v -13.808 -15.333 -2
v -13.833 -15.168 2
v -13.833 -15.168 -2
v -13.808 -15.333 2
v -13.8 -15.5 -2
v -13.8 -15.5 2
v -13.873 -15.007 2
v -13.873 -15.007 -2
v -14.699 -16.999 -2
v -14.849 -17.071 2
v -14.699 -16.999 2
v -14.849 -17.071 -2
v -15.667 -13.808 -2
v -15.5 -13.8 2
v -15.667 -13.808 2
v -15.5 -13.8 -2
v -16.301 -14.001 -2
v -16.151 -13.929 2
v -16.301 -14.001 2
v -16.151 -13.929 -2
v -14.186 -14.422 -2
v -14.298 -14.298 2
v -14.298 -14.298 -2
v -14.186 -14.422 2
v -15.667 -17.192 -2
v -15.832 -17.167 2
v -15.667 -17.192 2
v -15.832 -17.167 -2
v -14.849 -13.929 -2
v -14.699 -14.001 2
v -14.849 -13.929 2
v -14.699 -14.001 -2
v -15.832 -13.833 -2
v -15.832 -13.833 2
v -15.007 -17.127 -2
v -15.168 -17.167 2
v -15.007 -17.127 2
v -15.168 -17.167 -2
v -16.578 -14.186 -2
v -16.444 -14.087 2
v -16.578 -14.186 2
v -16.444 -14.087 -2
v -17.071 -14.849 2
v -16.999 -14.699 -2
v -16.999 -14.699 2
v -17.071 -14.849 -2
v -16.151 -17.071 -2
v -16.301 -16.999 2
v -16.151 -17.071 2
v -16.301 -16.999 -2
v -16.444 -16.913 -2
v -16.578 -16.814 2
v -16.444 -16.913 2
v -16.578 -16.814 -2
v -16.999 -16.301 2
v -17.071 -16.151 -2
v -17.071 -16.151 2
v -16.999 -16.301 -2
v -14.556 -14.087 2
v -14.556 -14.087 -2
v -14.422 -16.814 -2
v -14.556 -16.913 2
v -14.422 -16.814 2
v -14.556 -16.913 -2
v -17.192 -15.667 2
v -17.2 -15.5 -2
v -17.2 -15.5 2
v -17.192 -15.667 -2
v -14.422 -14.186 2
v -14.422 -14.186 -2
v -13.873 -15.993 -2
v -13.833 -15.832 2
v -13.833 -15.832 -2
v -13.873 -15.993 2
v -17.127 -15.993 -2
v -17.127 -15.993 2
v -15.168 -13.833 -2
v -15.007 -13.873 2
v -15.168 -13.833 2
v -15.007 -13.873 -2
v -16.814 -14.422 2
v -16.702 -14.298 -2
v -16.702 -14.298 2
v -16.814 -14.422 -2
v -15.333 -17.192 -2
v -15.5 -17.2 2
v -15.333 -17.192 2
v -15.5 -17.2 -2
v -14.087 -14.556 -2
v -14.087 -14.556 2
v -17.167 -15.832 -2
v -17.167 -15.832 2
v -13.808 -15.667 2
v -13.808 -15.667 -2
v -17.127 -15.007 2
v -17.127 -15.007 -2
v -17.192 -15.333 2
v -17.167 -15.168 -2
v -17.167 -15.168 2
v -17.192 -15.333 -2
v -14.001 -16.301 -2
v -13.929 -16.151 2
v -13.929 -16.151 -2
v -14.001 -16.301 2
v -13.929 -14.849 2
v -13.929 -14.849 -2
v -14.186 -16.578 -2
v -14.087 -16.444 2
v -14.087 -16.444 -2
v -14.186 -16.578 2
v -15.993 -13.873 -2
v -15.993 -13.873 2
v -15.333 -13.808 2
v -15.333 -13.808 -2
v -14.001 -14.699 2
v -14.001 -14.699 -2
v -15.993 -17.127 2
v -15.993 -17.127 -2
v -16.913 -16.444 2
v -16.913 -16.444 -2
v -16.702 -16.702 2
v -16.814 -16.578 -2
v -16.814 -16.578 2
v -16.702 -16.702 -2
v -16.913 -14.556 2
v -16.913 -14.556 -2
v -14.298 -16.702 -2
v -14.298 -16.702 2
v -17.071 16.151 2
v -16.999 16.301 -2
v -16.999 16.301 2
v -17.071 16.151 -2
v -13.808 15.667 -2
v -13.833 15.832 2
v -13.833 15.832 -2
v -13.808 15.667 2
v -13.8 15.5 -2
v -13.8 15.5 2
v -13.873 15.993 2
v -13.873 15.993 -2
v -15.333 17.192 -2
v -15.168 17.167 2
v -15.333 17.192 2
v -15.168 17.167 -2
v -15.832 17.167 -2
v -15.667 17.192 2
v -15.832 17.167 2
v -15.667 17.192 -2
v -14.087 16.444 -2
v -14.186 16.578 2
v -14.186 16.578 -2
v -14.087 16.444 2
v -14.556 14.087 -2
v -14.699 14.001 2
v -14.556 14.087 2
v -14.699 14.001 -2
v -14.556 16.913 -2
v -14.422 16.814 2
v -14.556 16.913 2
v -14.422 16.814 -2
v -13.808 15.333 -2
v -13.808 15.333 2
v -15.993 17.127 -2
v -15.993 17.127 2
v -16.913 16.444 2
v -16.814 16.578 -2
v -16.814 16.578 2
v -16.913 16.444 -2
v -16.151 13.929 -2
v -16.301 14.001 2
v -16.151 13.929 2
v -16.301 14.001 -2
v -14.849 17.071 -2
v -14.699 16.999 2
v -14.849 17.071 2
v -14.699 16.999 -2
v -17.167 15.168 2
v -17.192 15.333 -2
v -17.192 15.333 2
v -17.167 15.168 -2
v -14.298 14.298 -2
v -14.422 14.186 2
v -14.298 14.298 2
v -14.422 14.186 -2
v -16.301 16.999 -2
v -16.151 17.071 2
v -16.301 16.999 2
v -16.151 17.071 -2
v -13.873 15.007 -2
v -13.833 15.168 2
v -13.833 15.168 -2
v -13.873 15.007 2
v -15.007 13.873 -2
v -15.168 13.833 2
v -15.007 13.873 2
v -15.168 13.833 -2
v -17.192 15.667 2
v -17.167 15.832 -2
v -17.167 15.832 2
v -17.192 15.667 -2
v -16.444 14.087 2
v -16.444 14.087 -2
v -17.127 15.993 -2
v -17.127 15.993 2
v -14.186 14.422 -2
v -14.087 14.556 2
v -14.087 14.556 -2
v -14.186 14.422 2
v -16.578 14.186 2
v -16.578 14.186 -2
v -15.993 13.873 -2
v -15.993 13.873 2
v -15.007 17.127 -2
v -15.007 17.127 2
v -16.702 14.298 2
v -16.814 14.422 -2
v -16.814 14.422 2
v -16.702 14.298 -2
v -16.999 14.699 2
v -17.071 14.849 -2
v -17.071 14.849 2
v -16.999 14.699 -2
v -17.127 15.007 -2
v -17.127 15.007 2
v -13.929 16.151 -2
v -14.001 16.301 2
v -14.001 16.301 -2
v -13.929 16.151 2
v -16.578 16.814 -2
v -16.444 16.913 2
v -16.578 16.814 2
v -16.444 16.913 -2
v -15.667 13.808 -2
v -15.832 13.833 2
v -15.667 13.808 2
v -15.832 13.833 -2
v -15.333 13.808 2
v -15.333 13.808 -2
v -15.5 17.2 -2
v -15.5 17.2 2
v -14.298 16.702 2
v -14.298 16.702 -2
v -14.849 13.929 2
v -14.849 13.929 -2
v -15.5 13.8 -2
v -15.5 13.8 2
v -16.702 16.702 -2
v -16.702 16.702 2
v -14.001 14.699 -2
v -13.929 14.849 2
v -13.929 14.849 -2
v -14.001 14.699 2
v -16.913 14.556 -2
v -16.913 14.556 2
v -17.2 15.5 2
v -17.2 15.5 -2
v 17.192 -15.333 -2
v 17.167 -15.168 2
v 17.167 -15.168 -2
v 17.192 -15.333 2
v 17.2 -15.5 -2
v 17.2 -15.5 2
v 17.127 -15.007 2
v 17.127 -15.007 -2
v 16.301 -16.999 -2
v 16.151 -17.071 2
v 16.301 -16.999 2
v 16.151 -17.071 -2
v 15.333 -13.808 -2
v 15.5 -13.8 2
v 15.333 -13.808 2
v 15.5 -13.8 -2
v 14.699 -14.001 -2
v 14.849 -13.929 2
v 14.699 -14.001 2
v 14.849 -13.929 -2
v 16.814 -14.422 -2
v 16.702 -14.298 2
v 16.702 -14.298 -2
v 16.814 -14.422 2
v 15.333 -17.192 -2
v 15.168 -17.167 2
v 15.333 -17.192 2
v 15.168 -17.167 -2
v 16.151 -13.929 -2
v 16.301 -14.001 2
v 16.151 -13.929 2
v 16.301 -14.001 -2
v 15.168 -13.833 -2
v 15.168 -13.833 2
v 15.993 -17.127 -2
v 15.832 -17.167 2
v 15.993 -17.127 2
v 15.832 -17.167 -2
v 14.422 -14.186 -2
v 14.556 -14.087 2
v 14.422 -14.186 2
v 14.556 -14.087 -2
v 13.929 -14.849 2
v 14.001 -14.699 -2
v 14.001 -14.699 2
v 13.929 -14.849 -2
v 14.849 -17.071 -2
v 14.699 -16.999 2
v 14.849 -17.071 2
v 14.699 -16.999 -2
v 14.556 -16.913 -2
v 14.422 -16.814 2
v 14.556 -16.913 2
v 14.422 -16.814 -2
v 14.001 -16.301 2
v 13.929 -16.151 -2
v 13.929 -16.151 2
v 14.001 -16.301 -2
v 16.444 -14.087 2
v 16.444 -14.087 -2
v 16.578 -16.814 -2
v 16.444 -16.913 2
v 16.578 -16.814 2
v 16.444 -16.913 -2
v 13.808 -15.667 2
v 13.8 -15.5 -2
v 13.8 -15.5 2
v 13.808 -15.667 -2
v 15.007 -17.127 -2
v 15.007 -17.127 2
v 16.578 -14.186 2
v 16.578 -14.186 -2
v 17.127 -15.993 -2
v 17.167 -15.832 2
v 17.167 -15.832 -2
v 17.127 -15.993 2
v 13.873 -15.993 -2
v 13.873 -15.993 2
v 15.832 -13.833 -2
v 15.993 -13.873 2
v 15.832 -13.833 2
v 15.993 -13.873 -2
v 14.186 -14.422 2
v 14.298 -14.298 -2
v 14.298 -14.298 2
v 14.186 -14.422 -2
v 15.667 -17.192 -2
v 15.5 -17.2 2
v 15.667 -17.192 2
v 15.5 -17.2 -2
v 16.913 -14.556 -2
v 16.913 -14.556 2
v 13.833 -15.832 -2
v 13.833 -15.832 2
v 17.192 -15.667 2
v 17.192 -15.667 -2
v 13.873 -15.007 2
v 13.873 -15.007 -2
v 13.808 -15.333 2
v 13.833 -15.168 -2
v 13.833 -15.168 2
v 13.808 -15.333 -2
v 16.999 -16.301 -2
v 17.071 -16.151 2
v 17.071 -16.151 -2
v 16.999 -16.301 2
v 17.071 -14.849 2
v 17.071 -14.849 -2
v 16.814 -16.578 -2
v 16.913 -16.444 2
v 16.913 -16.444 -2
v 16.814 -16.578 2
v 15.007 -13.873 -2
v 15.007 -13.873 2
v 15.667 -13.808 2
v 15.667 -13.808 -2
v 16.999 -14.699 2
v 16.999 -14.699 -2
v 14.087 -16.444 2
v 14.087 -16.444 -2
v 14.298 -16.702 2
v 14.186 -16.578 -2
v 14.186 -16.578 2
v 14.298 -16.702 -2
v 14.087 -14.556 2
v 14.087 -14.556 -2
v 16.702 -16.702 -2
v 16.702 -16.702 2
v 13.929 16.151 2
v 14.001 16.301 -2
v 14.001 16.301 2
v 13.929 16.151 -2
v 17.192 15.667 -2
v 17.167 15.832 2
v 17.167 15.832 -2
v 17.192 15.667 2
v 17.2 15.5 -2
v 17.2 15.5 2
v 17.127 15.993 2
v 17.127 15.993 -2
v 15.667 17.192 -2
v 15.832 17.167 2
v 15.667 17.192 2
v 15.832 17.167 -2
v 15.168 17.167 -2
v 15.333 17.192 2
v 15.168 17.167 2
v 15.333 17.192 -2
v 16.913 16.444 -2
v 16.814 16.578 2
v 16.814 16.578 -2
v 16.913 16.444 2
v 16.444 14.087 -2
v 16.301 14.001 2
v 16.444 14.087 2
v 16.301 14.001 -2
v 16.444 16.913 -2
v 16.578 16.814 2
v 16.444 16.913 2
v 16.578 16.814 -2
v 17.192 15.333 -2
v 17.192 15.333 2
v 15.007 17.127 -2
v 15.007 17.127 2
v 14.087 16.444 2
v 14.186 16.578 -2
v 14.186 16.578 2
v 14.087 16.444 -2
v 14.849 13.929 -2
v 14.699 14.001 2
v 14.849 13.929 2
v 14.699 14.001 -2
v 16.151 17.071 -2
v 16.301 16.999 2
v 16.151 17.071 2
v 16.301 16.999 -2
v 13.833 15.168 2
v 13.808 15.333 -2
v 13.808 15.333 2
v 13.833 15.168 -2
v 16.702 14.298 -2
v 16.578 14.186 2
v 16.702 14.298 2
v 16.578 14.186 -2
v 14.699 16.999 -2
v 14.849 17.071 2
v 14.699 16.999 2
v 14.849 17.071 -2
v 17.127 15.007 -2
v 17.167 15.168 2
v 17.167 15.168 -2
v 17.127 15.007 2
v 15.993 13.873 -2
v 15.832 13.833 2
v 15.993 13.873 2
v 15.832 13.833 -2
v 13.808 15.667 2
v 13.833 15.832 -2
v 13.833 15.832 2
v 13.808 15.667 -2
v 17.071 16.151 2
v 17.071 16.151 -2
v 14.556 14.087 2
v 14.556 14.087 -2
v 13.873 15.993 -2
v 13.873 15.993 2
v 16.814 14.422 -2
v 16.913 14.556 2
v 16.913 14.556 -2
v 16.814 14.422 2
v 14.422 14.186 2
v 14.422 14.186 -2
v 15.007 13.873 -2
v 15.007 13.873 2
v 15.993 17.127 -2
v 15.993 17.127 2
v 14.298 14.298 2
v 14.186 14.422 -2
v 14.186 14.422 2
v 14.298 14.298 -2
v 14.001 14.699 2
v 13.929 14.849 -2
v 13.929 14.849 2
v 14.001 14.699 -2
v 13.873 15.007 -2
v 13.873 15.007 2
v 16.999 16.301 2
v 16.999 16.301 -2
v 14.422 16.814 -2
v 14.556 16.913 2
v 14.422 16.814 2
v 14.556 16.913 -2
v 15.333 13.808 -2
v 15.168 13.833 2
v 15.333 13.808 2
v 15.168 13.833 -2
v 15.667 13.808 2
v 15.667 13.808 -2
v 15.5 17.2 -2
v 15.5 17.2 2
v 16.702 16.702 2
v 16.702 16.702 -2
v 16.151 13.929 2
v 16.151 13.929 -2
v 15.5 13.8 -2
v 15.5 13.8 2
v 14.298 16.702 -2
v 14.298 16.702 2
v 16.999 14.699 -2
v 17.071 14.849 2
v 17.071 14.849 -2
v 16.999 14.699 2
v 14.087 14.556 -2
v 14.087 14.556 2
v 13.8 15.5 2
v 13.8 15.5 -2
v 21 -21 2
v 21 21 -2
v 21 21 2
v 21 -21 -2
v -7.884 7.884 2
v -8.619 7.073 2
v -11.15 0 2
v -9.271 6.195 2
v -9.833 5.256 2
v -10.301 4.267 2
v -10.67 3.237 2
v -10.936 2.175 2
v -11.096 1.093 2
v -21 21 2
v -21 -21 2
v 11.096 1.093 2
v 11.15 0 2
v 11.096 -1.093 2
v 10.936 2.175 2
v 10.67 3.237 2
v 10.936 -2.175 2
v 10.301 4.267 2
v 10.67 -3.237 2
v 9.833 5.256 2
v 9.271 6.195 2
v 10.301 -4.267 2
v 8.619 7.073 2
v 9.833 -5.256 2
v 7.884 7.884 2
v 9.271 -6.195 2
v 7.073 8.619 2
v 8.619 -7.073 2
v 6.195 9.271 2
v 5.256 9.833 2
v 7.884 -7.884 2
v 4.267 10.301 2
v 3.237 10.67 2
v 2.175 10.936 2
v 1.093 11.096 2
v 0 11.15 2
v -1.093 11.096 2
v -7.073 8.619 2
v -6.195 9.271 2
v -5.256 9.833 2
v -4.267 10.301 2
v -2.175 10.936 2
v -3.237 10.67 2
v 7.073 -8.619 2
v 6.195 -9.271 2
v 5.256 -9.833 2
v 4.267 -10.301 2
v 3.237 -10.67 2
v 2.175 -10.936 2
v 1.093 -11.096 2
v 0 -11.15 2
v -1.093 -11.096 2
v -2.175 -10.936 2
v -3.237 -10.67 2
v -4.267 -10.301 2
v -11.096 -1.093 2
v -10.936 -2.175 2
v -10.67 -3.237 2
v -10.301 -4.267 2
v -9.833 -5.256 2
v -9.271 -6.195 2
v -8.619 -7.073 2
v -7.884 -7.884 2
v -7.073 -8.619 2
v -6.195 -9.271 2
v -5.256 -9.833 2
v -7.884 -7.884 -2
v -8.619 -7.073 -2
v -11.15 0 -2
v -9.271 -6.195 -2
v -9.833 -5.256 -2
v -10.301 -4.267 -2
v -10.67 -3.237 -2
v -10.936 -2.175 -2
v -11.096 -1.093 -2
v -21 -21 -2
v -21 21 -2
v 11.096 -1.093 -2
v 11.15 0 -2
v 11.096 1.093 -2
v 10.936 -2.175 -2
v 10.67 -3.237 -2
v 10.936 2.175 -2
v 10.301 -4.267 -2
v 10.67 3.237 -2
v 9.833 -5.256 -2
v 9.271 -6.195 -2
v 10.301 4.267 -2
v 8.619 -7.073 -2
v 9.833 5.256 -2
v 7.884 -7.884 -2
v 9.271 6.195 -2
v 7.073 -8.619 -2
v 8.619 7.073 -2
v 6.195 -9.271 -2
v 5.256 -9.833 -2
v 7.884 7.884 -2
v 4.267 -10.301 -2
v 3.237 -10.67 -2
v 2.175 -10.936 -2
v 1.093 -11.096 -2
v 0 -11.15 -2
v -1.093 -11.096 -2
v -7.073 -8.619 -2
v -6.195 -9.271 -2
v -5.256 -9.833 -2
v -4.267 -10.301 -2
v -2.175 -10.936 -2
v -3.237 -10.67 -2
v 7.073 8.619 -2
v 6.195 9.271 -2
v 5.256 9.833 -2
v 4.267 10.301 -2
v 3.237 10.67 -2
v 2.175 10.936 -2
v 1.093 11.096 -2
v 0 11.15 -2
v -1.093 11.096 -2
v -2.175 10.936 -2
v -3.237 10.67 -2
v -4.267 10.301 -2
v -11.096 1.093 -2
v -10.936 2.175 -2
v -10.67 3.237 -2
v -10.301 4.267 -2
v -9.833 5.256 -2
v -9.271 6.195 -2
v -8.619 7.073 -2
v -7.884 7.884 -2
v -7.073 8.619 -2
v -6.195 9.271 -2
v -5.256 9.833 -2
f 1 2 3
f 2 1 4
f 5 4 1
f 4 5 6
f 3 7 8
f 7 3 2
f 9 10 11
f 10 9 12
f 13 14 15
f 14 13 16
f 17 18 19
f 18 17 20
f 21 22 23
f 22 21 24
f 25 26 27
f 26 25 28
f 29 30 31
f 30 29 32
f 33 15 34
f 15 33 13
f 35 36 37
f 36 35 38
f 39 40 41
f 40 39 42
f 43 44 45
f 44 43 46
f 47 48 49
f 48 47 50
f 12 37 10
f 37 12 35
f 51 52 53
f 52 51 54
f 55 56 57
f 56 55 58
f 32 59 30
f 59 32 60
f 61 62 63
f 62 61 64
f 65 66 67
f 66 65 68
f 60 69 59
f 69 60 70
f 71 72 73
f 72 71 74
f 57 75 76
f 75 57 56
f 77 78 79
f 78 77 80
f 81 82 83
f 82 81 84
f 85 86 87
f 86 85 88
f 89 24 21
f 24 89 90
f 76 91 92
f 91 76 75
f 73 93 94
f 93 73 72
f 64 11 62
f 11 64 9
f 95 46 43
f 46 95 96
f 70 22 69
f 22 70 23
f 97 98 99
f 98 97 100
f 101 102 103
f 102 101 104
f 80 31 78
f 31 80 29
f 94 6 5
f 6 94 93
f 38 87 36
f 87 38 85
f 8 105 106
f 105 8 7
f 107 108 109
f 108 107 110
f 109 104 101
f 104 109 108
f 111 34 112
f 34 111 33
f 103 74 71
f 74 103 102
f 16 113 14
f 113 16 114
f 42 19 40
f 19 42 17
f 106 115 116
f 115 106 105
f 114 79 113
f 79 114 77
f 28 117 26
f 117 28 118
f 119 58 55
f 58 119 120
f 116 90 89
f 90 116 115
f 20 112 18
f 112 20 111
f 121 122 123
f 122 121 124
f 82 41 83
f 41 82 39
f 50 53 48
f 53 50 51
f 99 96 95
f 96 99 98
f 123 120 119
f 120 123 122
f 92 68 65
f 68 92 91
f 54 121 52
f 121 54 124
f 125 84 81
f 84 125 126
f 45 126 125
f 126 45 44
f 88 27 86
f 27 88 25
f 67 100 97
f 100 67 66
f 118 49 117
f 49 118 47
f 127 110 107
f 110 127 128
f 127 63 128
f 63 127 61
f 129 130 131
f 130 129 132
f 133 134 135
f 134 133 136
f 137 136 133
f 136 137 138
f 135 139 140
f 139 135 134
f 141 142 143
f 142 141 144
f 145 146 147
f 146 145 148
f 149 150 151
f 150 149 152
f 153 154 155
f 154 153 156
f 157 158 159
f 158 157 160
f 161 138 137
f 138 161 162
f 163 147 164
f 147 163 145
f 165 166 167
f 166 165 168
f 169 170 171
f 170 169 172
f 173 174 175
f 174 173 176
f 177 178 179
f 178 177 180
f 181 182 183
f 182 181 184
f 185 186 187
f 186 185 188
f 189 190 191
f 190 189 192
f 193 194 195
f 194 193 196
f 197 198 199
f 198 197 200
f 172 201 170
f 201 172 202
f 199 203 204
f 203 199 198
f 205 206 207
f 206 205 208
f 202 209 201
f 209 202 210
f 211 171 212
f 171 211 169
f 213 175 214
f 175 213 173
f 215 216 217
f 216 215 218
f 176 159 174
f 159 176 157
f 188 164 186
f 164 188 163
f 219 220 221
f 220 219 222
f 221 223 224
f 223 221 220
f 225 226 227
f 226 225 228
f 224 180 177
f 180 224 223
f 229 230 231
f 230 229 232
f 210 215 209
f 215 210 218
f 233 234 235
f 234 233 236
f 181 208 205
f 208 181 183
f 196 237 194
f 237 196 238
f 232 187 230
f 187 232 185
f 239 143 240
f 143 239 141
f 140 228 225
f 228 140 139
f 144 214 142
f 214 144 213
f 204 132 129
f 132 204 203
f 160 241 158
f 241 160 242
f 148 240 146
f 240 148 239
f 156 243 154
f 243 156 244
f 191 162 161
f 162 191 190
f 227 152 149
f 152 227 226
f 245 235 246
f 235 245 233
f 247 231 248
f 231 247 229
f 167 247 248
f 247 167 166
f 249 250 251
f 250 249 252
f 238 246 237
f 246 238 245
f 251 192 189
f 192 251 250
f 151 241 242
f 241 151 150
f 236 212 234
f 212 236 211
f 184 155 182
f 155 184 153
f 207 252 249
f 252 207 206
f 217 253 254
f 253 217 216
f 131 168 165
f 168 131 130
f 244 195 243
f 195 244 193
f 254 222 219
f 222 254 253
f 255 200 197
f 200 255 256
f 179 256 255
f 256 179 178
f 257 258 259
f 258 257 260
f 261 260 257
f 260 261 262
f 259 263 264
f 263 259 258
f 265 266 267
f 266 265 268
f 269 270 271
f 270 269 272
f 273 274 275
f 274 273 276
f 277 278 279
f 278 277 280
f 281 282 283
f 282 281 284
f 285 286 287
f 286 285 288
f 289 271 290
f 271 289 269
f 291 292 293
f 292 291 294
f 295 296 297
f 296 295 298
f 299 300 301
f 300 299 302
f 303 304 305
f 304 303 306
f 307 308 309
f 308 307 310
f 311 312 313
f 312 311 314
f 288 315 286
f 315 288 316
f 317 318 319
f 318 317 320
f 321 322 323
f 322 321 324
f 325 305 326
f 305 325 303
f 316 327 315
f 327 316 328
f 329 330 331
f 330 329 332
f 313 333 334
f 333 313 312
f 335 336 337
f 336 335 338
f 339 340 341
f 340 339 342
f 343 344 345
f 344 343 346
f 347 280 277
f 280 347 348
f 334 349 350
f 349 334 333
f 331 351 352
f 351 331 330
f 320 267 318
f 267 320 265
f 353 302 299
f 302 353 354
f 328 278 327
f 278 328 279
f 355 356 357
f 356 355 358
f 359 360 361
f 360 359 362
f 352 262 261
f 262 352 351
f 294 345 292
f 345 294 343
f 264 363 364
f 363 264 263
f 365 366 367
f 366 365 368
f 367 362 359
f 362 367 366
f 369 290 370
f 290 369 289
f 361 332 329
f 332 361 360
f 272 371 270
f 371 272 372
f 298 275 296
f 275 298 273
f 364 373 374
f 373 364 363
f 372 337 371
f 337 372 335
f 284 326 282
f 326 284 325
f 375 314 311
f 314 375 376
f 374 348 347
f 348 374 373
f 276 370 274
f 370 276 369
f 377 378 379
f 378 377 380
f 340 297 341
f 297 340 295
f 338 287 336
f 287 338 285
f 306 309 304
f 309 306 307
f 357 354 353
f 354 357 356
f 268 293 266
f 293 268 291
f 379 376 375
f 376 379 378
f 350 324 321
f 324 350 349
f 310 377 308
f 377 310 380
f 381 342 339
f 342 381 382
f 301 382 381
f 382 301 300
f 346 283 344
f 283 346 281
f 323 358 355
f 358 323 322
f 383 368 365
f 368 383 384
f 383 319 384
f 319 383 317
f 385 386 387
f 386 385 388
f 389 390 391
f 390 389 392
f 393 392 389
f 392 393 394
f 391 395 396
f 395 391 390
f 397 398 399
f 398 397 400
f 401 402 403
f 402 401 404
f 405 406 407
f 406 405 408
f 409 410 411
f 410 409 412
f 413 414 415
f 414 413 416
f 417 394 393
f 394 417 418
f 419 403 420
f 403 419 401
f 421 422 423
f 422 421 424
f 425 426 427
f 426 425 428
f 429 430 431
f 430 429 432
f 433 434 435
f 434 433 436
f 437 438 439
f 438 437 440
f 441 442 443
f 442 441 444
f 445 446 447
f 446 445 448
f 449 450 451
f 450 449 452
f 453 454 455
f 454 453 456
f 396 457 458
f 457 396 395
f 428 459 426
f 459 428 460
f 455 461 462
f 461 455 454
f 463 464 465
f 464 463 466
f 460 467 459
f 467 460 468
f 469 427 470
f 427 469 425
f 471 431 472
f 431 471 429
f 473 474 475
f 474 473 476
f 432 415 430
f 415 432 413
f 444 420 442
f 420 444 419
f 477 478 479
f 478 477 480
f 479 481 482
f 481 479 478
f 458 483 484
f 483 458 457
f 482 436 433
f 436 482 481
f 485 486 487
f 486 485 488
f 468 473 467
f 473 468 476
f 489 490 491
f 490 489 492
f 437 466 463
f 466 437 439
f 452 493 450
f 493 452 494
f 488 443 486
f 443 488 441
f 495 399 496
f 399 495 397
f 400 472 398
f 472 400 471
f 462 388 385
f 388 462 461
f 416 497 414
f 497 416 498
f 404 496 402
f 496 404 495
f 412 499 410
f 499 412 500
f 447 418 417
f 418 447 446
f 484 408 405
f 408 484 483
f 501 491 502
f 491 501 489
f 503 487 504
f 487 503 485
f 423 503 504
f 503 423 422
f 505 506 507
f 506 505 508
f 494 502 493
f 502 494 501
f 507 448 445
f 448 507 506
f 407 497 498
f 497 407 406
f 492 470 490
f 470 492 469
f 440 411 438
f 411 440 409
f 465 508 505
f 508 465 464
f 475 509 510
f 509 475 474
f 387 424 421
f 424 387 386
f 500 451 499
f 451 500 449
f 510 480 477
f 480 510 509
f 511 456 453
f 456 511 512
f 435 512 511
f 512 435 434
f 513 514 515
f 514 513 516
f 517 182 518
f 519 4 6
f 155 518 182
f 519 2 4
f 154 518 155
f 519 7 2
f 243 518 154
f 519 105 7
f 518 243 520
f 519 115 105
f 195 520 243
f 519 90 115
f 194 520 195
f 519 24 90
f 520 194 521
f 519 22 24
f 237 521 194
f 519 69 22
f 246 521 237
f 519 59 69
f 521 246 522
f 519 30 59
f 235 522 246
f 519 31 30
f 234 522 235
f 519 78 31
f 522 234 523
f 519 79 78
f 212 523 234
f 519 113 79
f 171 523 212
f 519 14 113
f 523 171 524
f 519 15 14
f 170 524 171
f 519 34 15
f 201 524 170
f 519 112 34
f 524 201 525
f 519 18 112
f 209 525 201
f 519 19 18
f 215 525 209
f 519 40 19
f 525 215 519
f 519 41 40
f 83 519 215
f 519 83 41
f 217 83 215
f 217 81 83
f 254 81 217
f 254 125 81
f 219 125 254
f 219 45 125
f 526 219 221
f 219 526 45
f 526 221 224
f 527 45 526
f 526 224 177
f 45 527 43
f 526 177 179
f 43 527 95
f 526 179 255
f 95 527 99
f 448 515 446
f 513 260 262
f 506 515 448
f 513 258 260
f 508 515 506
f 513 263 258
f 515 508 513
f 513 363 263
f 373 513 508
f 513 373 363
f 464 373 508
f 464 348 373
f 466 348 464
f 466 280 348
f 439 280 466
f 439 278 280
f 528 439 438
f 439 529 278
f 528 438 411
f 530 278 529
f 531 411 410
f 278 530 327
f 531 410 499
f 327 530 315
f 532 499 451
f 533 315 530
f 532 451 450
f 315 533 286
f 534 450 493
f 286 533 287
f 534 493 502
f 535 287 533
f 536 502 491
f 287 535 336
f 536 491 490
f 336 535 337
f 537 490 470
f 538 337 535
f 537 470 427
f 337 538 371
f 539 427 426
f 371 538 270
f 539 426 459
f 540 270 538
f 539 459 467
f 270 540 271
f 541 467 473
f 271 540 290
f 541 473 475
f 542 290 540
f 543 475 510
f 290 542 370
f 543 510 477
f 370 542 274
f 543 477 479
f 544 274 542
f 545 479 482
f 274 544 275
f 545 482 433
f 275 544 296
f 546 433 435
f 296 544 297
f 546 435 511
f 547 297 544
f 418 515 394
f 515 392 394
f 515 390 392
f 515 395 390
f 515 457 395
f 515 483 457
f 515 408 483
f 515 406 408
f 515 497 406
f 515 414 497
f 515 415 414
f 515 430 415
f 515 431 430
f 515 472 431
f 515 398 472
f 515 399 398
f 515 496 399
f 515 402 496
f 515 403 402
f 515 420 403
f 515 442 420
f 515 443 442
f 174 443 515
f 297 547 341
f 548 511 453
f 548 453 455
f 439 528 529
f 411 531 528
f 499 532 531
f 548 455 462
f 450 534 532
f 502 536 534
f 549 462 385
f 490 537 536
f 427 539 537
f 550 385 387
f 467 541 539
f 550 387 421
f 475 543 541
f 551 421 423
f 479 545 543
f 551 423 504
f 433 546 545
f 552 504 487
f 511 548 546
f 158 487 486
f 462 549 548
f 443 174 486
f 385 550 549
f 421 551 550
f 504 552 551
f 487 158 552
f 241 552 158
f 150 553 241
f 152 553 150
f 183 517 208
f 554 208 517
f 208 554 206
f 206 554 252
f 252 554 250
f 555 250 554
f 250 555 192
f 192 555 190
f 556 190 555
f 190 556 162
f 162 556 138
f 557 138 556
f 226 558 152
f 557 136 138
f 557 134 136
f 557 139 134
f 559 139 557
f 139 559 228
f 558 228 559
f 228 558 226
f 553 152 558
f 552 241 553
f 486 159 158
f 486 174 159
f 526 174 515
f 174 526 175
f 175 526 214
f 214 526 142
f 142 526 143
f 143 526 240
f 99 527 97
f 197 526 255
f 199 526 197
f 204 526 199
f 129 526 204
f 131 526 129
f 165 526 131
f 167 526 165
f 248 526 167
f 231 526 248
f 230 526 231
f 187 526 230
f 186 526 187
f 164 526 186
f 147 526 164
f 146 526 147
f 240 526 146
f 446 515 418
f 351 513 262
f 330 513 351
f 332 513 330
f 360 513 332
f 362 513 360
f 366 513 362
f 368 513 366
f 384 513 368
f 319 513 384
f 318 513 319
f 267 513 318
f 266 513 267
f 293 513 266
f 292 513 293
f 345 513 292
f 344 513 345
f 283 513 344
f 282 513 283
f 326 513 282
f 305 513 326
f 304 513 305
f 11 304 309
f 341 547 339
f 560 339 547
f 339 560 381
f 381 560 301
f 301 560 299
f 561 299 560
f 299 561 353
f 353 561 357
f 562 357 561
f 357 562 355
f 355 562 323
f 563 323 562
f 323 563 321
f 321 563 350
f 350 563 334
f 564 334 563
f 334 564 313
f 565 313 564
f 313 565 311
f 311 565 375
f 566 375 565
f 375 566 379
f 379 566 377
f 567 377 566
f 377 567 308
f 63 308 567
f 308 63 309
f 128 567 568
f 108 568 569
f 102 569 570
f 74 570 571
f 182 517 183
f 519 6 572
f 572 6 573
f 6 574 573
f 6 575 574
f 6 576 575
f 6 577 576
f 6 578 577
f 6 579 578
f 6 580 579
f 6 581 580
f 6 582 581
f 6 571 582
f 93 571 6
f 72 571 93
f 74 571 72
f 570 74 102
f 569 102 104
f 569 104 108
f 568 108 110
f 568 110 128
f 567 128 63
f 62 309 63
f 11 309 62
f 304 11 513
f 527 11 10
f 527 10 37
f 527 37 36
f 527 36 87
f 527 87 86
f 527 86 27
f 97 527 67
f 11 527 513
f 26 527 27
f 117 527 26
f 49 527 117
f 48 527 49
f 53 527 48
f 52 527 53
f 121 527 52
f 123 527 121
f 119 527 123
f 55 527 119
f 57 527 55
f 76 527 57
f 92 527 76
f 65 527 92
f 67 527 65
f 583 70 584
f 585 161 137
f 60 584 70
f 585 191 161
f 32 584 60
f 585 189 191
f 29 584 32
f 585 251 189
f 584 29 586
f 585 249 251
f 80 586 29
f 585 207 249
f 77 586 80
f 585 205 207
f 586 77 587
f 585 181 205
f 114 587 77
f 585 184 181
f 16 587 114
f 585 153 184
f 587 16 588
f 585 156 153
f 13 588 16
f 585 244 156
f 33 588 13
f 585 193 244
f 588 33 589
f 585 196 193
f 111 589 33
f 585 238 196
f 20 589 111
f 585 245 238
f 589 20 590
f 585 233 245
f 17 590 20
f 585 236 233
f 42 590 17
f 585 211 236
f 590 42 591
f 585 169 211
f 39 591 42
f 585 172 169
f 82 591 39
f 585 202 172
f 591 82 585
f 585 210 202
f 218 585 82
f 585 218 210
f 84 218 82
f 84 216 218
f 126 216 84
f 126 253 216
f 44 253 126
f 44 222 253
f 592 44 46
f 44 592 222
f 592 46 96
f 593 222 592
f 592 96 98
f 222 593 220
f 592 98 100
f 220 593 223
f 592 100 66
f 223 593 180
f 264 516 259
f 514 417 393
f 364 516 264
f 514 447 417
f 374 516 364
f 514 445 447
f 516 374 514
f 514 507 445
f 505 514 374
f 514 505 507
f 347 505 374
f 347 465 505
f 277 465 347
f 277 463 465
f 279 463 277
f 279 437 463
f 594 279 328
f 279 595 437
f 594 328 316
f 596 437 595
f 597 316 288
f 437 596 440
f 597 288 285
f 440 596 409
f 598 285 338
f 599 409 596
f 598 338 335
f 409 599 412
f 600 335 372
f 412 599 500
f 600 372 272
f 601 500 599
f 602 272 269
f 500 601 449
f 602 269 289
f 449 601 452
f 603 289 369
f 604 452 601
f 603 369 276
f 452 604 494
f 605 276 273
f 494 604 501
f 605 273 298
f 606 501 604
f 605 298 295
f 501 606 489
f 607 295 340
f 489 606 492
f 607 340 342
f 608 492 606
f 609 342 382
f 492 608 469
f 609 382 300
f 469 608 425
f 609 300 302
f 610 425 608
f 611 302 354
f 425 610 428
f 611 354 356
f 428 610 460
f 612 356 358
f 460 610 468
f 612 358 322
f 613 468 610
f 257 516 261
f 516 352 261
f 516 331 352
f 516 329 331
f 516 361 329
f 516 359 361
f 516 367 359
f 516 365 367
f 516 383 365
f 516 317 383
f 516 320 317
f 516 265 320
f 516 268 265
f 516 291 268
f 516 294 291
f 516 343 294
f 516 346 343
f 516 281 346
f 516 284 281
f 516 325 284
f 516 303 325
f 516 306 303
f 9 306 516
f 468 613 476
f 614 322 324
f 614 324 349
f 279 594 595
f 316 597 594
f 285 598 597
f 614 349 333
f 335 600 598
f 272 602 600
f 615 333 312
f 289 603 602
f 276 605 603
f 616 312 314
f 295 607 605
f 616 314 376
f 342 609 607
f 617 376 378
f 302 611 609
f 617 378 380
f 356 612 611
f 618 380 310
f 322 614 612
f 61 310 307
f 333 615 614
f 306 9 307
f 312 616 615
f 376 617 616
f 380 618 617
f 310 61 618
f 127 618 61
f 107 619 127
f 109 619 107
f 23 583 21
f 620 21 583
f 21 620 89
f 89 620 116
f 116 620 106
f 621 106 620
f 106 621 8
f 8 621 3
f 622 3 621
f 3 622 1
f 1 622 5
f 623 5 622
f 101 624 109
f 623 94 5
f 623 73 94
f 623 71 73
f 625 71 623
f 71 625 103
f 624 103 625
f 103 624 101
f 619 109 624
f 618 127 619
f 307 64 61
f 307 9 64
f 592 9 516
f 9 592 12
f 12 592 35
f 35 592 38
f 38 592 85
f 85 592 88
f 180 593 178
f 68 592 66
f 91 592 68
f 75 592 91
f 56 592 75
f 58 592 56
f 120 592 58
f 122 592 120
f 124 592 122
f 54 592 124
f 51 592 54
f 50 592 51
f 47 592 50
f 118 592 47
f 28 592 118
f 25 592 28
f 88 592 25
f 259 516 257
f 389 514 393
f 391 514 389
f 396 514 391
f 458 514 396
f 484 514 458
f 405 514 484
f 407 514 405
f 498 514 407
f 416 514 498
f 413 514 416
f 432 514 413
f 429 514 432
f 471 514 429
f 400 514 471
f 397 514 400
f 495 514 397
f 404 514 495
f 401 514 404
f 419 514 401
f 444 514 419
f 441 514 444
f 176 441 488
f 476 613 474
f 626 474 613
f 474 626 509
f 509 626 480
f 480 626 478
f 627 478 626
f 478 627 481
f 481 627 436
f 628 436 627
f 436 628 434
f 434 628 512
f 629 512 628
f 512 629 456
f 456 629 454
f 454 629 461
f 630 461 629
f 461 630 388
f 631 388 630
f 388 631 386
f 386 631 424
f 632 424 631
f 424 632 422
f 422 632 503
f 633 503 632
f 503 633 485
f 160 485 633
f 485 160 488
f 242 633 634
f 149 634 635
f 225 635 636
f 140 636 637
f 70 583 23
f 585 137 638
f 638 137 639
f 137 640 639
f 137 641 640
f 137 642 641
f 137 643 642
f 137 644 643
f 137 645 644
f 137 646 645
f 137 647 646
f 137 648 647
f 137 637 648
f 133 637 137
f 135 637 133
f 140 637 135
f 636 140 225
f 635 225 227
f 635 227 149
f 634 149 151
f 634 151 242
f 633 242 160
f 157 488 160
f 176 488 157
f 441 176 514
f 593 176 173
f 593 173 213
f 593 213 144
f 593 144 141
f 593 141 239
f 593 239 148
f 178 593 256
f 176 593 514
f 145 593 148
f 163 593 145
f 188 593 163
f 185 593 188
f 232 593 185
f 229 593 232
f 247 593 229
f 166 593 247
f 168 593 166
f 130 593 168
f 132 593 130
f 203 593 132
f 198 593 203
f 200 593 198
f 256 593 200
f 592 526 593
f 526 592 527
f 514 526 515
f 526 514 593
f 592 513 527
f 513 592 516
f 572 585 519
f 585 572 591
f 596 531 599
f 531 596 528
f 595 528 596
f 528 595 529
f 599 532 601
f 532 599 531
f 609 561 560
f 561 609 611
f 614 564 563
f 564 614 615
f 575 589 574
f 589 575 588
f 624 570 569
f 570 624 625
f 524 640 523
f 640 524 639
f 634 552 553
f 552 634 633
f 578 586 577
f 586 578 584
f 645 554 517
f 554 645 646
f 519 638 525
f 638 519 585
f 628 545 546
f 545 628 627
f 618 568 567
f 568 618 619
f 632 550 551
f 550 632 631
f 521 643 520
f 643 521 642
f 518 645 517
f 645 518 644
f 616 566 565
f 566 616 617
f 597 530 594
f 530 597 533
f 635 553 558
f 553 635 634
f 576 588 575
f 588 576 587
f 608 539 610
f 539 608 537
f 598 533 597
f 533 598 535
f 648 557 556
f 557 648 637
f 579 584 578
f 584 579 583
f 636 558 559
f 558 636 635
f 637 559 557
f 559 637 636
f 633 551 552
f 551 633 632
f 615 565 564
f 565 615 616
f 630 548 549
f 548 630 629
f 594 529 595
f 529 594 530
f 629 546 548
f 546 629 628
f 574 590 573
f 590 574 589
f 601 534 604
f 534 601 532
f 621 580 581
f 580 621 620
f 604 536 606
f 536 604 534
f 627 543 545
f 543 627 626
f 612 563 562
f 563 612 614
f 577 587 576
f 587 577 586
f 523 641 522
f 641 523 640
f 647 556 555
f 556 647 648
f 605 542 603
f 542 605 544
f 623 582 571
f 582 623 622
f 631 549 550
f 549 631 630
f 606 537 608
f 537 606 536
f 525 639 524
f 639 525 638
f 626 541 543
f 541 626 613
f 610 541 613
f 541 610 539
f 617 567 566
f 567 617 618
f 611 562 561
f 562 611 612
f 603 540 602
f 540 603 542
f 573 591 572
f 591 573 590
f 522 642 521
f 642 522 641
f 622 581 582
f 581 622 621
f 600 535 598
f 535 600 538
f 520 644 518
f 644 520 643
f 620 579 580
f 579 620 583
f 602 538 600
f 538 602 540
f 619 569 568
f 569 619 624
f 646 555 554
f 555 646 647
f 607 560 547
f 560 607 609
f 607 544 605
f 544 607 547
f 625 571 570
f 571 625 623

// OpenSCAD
// Motor mounting plate: 42 x 42 x 4 mm, four M3 clearance holes on a
// 31 mm square, central 22.3 mm pilot bore. All holes through.

$fn = 64;

size = 42;
thickness = 4;
hole_pitch = 31;
hole_d = 3.4;
bore_d = 22.3;

difference() {
    cube([size, size, thickness], center = true);
    cylinder(h = thickness + 2, d = bore_d, center = true);
    for (x = [-1, 1], y = [-1, 1])
        translate([x * hole_pitch / 2, y * hole_pitch / 2, 0])
            cylinder(h = thickness + 2, d = hole_d, center = true);
}
